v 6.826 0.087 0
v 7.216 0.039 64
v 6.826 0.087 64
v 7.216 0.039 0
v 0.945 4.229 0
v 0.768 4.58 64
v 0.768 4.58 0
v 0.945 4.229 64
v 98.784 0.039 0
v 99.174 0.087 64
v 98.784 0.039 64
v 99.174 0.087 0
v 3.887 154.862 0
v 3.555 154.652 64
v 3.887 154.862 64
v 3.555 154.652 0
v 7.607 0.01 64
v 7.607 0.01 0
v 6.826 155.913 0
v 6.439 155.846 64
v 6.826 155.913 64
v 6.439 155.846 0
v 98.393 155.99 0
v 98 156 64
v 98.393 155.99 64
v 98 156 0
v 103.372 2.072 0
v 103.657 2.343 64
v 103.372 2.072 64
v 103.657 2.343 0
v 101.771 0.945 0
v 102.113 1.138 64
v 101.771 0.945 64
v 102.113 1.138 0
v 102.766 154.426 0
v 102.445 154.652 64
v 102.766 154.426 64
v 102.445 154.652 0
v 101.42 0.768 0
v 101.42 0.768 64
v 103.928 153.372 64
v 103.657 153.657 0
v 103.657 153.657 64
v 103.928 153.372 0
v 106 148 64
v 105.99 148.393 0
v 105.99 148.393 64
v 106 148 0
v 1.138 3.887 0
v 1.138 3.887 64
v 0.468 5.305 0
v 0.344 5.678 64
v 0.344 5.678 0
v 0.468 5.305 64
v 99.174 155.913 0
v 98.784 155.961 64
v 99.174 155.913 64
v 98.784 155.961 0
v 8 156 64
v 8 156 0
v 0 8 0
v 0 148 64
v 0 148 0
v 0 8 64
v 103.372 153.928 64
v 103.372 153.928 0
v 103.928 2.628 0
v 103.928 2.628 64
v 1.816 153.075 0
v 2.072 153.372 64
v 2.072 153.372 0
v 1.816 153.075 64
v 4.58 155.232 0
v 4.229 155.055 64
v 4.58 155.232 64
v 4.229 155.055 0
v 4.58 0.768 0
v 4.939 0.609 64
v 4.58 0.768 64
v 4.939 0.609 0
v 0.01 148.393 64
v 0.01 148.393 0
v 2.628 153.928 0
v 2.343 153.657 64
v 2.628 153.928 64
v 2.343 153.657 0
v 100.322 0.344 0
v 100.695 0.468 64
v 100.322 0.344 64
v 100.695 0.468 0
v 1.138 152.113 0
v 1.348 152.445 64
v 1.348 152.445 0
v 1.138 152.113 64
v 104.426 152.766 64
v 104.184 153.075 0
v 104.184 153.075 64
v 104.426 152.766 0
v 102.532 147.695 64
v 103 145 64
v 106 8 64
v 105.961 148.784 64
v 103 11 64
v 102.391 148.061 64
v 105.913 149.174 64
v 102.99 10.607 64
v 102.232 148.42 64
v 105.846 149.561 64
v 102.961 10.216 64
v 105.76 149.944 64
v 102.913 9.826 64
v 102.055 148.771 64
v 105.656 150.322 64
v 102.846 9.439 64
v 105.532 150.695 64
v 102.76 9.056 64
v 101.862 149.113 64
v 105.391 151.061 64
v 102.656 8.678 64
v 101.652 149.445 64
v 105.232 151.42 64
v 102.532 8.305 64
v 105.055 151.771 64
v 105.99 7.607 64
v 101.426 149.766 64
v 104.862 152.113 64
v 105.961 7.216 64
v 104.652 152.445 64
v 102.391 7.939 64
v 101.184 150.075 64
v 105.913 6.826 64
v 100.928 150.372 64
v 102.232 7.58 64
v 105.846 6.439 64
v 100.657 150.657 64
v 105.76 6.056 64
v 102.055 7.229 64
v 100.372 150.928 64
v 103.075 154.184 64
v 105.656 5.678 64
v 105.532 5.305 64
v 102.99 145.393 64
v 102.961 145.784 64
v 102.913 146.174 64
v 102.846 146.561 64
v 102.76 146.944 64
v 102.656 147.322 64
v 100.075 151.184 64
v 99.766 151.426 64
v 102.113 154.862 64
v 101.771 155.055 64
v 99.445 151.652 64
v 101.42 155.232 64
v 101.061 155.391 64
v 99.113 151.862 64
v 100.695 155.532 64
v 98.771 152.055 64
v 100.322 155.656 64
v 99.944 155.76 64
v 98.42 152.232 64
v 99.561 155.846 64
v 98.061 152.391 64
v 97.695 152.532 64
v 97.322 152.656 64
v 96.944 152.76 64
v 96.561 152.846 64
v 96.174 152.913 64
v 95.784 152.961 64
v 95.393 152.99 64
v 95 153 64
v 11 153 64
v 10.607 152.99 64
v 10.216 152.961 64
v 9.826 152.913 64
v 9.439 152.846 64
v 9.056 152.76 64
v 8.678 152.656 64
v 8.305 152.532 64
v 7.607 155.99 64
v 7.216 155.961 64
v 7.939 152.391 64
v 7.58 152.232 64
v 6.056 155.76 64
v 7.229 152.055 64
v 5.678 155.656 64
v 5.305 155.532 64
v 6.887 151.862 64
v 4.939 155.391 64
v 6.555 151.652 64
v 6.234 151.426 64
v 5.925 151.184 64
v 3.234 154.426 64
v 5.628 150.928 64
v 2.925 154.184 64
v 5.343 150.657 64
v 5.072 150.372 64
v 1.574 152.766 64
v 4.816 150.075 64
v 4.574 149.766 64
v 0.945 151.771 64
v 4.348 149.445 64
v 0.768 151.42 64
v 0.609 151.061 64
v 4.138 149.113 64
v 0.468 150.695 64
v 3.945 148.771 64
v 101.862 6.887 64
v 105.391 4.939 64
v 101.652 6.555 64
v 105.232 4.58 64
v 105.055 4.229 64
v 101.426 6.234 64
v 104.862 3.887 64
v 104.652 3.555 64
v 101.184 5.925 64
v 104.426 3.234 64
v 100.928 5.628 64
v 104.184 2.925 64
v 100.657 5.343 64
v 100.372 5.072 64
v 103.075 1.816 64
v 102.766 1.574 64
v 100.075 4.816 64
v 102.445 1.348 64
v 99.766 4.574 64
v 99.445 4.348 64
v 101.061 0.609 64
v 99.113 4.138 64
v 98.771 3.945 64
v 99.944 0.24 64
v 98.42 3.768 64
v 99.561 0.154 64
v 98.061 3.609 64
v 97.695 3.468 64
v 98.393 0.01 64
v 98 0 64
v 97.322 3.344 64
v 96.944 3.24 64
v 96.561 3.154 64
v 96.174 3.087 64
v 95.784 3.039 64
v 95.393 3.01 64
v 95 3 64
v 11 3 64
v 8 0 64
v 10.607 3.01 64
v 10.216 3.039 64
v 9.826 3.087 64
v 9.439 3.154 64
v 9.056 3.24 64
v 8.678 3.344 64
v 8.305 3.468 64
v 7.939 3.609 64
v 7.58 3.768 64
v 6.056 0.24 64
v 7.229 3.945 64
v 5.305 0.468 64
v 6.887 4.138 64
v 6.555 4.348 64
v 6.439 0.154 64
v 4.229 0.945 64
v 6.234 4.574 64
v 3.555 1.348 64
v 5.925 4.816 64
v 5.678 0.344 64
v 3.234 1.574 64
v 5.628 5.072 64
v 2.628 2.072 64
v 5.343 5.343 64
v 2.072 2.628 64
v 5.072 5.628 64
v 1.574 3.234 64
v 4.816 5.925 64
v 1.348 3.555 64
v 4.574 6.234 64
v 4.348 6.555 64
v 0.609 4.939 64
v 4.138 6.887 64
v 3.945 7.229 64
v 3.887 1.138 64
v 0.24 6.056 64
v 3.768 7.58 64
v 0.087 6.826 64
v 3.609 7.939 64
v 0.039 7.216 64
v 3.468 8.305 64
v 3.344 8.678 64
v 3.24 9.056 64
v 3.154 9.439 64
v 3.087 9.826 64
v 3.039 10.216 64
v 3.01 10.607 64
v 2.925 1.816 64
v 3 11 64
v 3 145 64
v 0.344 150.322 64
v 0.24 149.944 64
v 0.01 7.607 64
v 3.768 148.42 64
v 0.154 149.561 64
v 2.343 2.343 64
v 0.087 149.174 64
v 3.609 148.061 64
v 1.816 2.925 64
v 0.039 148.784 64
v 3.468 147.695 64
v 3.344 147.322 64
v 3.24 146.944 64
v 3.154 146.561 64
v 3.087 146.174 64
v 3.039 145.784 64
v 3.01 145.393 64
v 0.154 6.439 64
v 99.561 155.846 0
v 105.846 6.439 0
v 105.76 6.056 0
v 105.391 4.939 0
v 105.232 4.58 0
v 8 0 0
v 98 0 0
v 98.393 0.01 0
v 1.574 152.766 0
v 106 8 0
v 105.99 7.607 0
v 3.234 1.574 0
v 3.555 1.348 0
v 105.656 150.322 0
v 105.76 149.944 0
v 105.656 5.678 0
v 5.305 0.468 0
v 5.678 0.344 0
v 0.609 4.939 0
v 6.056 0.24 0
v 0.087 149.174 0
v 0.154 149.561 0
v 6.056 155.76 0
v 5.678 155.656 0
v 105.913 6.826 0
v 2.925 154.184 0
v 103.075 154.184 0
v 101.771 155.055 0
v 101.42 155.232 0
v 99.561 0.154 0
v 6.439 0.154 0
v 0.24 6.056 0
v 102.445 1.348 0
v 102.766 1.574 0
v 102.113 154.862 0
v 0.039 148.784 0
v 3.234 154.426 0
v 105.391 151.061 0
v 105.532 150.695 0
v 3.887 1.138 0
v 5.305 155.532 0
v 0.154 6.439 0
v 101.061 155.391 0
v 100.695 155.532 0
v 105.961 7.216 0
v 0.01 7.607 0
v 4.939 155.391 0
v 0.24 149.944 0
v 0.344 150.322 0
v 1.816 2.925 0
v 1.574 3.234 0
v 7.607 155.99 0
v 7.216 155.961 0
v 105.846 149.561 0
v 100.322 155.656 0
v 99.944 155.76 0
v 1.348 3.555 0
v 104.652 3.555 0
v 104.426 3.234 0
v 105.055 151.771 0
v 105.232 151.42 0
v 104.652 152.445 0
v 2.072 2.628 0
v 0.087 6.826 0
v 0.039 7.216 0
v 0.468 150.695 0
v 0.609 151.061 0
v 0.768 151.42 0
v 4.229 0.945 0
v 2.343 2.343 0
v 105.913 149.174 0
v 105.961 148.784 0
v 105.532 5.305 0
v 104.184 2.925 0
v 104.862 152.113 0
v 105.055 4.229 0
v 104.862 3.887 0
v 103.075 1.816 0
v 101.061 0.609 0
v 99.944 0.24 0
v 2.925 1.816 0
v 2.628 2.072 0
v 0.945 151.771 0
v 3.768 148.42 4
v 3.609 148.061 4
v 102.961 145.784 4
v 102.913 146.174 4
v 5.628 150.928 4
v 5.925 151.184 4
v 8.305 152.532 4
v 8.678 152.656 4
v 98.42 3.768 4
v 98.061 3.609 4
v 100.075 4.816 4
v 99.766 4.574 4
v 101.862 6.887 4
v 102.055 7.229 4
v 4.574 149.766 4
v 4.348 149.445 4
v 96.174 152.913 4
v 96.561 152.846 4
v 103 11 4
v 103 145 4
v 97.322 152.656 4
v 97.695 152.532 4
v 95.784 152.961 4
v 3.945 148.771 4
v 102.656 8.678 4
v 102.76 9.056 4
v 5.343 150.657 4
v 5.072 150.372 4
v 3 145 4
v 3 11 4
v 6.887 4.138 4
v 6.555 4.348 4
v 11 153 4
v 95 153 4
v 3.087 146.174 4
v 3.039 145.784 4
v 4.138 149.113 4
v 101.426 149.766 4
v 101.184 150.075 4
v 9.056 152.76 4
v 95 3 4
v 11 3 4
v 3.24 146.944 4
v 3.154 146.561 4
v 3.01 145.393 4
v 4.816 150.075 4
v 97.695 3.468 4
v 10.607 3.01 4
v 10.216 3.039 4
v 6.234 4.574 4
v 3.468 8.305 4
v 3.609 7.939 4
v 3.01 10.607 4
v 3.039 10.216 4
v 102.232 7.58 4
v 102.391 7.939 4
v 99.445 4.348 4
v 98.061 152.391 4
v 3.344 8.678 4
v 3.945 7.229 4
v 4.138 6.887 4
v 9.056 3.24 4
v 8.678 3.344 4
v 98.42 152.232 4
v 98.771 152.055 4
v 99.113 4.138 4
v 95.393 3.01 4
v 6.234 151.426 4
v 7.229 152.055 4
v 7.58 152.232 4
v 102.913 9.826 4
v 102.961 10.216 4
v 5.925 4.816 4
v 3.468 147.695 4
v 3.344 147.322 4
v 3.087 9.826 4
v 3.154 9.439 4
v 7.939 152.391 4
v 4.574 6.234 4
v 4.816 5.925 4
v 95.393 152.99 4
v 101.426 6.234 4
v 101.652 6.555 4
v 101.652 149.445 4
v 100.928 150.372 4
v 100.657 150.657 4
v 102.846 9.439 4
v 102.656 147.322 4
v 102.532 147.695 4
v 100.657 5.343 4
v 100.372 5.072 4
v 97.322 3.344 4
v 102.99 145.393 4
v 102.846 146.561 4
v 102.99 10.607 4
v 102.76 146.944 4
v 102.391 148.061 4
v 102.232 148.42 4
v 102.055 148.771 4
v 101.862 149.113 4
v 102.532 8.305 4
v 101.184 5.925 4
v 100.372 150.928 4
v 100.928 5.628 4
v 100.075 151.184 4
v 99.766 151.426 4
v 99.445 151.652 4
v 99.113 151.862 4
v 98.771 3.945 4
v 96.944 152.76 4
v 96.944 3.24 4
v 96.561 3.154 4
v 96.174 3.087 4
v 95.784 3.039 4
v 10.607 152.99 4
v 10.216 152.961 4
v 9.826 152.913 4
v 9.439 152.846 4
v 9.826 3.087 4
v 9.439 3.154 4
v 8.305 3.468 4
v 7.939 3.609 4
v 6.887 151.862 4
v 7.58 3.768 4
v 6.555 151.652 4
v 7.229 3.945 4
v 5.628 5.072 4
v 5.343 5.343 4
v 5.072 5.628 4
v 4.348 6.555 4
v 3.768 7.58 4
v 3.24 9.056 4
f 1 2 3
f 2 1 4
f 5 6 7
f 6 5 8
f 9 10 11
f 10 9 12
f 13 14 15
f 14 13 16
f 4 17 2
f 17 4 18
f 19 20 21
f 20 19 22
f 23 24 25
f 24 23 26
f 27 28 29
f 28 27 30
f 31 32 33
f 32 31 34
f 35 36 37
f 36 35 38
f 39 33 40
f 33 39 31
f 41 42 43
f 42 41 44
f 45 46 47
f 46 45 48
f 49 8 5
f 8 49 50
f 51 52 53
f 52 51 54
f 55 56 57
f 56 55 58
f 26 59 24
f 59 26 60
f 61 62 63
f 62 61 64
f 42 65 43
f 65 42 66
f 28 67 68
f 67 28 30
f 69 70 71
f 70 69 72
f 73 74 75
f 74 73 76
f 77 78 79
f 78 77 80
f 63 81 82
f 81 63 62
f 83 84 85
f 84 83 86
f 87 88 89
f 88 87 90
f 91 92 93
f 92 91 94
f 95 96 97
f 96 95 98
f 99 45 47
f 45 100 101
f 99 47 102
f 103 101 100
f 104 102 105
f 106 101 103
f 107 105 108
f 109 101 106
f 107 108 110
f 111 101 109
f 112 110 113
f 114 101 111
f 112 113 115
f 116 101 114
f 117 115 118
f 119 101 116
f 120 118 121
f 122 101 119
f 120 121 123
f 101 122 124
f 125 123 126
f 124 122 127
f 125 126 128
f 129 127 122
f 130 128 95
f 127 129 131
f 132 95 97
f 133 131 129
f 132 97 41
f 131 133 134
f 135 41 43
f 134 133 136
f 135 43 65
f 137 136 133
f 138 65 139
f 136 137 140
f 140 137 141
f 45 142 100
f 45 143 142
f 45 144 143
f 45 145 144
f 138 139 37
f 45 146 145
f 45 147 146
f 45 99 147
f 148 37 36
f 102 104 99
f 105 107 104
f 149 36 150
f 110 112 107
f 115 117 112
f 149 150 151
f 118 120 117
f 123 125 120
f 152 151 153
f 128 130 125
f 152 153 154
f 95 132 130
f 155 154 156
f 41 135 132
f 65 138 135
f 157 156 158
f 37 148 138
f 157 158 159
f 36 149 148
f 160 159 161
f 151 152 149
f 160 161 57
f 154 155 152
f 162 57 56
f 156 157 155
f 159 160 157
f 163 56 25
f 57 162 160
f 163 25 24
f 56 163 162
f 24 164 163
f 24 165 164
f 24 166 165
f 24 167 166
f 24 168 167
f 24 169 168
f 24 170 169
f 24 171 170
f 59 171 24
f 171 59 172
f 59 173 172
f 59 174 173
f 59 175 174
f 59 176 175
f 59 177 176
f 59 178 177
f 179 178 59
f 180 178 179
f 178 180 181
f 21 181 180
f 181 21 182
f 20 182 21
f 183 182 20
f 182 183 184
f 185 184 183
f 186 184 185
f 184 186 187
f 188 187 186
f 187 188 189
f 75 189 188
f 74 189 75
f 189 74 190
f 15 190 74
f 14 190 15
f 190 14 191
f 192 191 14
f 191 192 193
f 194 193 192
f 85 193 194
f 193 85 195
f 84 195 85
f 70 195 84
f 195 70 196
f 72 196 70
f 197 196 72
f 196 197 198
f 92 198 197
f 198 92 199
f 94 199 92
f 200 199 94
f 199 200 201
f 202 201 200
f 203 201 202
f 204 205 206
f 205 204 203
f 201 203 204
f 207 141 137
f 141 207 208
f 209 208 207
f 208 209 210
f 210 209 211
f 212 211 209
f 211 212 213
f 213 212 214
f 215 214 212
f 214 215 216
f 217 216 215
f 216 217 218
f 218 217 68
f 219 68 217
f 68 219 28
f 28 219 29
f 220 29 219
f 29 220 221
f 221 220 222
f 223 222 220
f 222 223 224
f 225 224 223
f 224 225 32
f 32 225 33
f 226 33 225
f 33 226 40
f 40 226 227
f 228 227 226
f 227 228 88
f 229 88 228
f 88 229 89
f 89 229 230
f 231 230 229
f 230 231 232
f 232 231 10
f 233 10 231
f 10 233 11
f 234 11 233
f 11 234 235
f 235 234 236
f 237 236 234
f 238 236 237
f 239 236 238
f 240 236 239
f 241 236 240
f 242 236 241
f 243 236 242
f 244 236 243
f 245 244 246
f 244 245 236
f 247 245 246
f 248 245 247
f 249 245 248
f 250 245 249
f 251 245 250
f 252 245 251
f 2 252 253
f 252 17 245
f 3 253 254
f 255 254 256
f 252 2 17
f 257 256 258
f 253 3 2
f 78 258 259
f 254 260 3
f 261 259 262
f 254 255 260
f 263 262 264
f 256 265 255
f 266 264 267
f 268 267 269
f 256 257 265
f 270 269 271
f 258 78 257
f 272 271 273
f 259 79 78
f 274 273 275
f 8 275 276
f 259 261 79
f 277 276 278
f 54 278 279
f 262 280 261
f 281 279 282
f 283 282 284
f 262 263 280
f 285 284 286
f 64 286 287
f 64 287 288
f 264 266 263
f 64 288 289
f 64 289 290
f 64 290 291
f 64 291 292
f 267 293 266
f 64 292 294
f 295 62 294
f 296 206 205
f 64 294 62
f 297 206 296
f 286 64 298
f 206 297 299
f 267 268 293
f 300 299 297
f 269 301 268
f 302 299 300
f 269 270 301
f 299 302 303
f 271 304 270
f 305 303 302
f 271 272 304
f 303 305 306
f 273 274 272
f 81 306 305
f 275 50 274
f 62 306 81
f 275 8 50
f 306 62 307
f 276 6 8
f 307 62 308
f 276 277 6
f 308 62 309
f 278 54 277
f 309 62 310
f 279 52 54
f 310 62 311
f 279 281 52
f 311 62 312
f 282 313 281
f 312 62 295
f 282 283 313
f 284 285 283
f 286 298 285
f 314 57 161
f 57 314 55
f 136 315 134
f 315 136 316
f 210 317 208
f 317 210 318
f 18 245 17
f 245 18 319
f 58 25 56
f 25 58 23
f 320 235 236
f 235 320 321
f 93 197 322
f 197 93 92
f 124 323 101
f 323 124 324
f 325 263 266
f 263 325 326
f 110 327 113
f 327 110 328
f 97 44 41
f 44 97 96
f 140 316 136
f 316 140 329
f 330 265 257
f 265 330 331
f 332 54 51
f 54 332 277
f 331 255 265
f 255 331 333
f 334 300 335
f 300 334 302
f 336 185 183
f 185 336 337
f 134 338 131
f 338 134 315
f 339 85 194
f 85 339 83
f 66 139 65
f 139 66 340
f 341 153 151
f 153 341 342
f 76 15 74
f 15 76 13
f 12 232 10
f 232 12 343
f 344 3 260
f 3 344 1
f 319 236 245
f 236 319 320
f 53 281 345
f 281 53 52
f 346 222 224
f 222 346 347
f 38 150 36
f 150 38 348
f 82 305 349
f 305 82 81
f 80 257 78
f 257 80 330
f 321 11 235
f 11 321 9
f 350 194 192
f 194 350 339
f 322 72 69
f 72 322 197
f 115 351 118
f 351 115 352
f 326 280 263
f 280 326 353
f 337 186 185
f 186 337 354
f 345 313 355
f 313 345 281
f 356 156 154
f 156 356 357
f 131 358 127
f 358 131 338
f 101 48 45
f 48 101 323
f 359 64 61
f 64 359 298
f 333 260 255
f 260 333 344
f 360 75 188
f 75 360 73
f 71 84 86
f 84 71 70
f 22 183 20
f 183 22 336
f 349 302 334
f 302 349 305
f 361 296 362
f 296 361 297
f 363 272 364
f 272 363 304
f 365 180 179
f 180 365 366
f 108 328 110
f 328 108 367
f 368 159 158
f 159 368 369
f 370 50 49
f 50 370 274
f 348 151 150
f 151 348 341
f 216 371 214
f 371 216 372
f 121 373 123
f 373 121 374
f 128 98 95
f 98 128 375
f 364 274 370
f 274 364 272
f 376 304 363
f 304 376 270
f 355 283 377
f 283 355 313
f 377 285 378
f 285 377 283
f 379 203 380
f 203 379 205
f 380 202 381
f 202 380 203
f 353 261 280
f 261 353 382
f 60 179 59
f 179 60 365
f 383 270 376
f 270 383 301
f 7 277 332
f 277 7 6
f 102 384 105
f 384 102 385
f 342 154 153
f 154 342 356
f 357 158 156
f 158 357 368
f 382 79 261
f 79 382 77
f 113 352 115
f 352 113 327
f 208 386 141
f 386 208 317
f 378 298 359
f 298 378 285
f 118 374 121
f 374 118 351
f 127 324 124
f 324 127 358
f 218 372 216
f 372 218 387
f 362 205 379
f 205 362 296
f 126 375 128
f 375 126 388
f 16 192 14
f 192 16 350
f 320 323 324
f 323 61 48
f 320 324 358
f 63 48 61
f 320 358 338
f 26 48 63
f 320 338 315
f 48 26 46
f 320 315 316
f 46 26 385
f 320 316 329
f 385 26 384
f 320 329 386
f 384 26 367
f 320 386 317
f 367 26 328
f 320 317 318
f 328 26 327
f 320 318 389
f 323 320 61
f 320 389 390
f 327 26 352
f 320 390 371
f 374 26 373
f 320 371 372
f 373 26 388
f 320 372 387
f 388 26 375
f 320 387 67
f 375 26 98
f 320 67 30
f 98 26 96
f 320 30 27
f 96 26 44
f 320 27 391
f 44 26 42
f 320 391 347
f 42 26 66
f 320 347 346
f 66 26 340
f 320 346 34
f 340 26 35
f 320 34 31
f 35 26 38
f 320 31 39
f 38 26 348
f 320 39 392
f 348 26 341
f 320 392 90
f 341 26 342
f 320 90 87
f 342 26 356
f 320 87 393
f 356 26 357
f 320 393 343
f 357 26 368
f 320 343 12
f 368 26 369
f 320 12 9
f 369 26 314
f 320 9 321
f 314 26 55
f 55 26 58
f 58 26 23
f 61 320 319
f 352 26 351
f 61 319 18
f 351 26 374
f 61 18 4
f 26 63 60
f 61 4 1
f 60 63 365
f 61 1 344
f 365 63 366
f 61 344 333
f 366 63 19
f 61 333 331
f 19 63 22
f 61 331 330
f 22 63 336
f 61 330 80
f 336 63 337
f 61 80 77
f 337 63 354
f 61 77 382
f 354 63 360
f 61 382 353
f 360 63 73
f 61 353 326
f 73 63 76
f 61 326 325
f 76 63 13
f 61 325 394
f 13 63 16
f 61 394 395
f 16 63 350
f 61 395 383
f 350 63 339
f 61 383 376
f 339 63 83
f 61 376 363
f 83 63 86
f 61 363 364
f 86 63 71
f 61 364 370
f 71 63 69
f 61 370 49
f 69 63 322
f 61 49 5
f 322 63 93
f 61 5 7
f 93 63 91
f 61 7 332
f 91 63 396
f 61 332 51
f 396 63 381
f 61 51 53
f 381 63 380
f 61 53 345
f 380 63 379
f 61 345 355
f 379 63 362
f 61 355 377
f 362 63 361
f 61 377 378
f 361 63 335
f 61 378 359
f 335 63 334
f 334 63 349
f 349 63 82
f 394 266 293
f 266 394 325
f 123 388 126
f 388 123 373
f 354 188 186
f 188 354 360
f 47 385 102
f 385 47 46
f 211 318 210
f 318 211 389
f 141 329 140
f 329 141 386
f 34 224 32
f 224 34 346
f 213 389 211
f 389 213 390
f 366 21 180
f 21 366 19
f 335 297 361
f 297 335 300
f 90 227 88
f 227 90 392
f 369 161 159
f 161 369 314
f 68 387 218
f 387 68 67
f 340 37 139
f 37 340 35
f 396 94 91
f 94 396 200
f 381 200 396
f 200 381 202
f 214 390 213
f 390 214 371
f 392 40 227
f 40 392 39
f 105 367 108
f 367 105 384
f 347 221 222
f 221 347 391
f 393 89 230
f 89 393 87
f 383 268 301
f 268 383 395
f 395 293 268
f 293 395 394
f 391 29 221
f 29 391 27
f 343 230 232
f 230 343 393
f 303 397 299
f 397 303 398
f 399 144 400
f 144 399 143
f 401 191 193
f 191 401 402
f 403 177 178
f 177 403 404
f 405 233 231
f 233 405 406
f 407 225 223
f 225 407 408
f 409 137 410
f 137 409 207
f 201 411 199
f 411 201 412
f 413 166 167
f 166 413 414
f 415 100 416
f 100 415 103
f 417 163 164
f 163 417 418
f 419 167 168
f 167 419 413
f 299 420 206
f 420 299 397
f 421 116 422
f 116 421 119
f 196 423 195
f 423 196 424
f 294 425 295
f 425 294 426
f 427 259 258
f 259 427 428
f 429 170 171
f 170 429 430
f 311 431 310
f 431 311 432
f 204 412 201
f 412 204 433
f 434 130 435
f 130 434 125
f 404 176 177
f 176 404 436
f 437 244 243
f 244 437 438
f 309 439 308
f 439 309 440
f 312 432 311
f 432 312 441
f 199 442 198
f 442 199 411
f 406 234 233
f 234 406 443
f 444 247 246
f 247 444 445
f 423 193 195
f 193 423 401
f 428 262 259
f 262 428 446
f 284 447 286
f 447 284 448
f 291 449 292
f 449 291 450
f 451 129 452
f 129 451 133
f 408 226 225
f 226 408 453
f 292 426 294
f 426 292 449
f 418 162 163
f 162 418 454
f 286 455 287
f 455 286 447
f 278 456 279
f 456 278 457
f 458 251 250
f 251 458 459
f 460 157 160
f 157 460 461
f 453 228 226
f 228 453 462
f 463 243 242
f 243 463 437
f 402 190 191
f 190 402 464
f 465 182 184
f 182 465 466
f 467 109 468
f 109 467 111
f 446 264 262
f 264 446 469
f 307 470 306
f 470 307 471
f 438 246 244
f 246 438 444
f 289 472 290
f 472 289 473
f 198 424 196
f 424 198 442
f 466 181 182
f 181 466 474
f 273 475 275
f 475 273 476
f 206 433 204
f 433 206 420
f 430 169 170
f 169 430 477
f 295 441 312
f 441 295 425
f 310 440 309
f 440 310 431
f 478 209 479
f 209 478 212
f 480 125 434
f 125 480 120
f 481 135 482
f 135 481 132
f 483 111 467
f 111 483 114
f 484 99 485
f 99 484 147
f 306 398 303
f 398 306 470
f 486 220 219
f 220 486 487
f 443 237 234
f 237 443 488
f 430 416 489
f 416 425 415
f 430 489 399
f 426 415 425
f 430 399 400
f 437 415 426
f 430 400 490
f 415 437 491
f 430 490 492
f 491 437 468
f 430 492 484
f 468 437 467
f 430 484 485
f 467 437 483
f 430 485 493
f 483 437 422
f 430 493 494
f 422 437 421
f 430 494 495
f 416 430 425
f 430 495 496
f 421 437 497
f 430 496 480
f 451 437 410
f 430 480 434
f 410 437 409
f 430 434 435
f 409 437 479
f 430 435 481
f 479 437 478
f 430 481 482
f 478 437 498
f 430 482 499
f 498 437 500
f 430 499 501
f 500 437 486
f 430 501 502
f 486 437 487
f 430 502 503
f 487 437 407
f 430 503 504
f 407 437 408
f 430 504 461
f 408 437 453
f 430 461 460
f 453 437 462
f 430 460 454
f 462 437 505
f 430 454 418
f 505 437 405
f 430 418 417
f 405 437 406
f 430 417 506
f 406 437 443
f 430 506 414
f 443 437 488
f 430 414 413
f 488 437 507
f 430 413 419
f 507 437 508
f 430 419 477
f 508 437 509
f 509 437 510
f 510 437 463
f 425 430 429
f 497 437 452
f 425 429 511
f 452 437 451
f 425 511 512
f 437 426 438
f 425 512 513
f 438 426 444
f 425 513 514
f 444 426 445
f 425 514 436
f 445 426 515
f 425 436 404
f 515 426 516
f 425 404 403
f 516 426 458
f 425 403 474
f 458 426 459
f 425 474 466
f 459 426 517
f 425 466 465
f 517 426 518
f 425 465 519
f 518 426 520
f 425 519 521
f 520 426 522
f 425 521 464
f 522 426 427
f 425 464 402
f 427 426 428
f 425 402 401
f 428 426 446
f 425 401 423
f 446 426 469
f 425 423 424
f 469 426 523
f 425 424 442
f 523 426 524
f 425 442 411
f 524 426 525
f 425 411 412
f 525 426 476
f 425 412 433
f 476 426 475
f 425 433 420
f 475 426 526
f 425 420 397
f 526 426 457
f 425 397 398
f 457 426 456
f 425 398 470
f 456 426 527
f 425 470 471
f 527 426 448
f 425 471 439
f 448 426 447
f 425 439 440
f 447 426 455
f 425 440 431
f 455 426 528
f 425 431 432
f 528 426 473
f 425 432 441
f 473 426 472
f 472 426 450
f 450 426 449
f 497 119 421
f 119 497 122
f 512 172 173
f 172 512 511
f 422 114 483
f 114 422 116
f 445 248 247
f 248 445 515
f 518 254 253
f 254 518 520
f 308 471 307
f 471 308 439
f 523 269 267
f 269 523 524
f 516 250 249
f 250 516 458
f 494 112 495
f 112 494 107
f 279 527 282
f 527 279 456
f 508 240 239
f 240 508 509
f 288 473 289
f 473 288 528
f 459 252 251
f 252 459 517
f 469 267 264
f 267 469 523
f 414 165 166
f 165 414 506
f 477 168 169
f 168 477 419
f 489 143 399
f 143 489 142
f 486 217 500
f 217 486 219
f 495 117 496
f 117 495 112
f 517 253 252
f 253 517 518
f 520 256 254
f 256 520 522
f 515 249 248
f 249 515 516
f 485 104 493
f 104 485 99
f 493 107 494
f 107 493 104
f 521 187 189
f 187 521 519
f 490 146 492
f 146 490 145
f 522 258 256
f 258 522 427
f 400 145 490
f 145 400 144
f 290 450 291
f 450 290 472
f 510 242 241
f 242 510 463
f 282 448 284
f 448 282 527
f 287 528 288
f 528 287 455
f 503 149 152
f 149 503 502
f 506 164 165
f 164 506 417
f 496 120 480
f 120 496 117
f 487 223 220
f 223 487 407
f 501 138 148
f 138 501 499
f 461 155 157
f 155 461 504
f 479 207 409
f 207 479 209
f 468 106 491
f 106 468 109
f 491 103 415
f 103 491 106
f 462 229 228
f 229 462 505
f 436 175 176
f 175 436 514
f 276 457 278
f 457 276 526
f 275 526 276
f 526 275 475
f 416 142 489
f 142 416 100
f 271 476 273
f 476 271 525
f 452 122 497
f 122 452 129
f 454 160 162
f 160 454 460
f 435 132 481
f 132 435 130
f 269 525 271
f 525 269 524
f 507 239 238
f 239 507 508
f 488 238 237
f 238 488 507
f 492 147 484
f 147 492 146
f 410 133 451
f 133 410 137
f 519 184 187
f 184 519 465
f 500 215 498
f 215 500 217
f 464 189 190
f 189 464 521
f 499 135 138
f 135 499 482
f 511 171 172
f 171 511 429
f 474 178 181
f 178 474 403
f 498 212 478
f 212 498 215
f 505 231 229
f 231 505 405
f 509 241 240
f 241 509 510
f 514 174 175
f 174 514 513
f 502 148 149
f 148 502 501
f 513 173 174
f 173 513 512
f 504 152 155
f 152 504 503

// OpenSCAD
//=====================================================================
// YAPPE
// Base 
//
// Project : YAPPE
// File    : YAPPE_Base.scad
// Author  : Björn Verbruggen
//
// Description
// ------------
// YAPPE is Yet Another Pump Placement Element.
// YAPPE is designed for the Ubbink Air 100 indoor air pump.
// YAPPE allows inexpensive indoor air pumps to survive outdoor use. Because buying a proper outdoor pump would be far too sensible.
// YAPPE helps your pump survive Belgian Summer humidity ;)
// 
// Separate printable parts:
// - base/inner box (this file)
// - lid/outer box
// - feet
//
// Model philosophy
// ----------------
// 1. Reuse previous created parts.
// 2. Only add air grid and pump support in base.
// 3. Printable in PETG/ABS/ASA; shoult fit Prusa Mini+ or Bambu X1C
// 4. KISS+: design contains only logic where needed, calibration is done manually.
// 
//
// Version
// -------
// YAPPE 0.1
//=====================================================================

//=====================================================================
// PARAMETERS
//=====================================================================


//--------------------------------------------------
// Internal dimensions
//--------------------------------------------------

inside_length = 100;      // mm
inside_width  = 150;      // mm
inside_height = 60;       // mm


//--------------------------------------------------
// Wall dimensions
//--------------------------------------------------

wall_thickness  = 3;      // mm
floor_thickness = 4;      // mm


//--------------------------------------------------
// Corner radius
//--------------------------------------------------

corner_radius = 8;        // mm


//--------------------------------------------------
// Boolean operations
//--------------------------------------------------

boolean_overlap = 1;      // mm




//--------------------------------------------------
// Rendering
//--------------------------------------------------

preview_fn = 24;
render_fn  = 128;

$fn = render_fn;




//=====================================================================
// DERIVED DIMENSIONS
//=====================================================================


//--------------------------------------------------
// Enclosure
//--------------------------------------------------

outside_length =
    inside_length +
    (wall_thickness * 2);

outside_width =
    inside_width +
    (wall_thickness * 2);

outside_height =
    inside_height +
    floor_thickness;





//=====================================================================
// MODULES
//=====================================================================


//--------------------------------------------------
// Corner
//--------------------------------------------------

module corner(x, y, height)
{

    translate([x, y, 0])
    {

        cylinder(
            h = height,
            r = corner_radius
        );

    }

}


//--------------------------------------------------
// Shell
//--------------------------------------------------

module shell()
{

    hull()
    {

        corner(
            corner_radius,
            corner_radius,
            outside_height
        );

        corner(
            outside_length - corner_radius,
            corner_radius,
            outside_height
        );

        corner(
            outside_length - corner_radius,
            outside_width - corner_radius,
            outside_height
        );

        corner(
            corner_radius,
            outside_width - corner_radius,
            outside_height
        );

    }

}



//--------------------------------------------------
// Cavity
//--------------------------------------------------

module cavity()
{

    translate([
        wall_thickness,
        wall_thickness,
        floor_thickness
    ])
    {

        hull()
        {

            corner(
                corner_radius,
                corner_radius,
                inside_height + boolean_overlap
            );

            corner(
                inside_length - corner_radius,
                corner_radius,
                inside_height + boolean_overlap
            );

            corner(
                inside_length - corner_radius,
                inside_width - corner_radius,
                inside_height + boolean_overlap
            );

            corner(
                corner_radius,
                inside_width - corner_radius,
                inside_height + boolean_overlap
            );

        }

    }

}




//=====================================================================
// MAIN ASSEMBLY
//=====================================================================

module base()
{
    difference()
    {
        //--------------------------------------------------
        // Complete geometry
        //--------------------------------------------------

        union()
        {
            //----------------------------------
            // Enclosure shell
            //----------------------------------

            difference()
            {
                shell();
                cavity();
            }

            //----------------------------------
            // Internal structures
            //----------------------------------





    }
}
}
base();
